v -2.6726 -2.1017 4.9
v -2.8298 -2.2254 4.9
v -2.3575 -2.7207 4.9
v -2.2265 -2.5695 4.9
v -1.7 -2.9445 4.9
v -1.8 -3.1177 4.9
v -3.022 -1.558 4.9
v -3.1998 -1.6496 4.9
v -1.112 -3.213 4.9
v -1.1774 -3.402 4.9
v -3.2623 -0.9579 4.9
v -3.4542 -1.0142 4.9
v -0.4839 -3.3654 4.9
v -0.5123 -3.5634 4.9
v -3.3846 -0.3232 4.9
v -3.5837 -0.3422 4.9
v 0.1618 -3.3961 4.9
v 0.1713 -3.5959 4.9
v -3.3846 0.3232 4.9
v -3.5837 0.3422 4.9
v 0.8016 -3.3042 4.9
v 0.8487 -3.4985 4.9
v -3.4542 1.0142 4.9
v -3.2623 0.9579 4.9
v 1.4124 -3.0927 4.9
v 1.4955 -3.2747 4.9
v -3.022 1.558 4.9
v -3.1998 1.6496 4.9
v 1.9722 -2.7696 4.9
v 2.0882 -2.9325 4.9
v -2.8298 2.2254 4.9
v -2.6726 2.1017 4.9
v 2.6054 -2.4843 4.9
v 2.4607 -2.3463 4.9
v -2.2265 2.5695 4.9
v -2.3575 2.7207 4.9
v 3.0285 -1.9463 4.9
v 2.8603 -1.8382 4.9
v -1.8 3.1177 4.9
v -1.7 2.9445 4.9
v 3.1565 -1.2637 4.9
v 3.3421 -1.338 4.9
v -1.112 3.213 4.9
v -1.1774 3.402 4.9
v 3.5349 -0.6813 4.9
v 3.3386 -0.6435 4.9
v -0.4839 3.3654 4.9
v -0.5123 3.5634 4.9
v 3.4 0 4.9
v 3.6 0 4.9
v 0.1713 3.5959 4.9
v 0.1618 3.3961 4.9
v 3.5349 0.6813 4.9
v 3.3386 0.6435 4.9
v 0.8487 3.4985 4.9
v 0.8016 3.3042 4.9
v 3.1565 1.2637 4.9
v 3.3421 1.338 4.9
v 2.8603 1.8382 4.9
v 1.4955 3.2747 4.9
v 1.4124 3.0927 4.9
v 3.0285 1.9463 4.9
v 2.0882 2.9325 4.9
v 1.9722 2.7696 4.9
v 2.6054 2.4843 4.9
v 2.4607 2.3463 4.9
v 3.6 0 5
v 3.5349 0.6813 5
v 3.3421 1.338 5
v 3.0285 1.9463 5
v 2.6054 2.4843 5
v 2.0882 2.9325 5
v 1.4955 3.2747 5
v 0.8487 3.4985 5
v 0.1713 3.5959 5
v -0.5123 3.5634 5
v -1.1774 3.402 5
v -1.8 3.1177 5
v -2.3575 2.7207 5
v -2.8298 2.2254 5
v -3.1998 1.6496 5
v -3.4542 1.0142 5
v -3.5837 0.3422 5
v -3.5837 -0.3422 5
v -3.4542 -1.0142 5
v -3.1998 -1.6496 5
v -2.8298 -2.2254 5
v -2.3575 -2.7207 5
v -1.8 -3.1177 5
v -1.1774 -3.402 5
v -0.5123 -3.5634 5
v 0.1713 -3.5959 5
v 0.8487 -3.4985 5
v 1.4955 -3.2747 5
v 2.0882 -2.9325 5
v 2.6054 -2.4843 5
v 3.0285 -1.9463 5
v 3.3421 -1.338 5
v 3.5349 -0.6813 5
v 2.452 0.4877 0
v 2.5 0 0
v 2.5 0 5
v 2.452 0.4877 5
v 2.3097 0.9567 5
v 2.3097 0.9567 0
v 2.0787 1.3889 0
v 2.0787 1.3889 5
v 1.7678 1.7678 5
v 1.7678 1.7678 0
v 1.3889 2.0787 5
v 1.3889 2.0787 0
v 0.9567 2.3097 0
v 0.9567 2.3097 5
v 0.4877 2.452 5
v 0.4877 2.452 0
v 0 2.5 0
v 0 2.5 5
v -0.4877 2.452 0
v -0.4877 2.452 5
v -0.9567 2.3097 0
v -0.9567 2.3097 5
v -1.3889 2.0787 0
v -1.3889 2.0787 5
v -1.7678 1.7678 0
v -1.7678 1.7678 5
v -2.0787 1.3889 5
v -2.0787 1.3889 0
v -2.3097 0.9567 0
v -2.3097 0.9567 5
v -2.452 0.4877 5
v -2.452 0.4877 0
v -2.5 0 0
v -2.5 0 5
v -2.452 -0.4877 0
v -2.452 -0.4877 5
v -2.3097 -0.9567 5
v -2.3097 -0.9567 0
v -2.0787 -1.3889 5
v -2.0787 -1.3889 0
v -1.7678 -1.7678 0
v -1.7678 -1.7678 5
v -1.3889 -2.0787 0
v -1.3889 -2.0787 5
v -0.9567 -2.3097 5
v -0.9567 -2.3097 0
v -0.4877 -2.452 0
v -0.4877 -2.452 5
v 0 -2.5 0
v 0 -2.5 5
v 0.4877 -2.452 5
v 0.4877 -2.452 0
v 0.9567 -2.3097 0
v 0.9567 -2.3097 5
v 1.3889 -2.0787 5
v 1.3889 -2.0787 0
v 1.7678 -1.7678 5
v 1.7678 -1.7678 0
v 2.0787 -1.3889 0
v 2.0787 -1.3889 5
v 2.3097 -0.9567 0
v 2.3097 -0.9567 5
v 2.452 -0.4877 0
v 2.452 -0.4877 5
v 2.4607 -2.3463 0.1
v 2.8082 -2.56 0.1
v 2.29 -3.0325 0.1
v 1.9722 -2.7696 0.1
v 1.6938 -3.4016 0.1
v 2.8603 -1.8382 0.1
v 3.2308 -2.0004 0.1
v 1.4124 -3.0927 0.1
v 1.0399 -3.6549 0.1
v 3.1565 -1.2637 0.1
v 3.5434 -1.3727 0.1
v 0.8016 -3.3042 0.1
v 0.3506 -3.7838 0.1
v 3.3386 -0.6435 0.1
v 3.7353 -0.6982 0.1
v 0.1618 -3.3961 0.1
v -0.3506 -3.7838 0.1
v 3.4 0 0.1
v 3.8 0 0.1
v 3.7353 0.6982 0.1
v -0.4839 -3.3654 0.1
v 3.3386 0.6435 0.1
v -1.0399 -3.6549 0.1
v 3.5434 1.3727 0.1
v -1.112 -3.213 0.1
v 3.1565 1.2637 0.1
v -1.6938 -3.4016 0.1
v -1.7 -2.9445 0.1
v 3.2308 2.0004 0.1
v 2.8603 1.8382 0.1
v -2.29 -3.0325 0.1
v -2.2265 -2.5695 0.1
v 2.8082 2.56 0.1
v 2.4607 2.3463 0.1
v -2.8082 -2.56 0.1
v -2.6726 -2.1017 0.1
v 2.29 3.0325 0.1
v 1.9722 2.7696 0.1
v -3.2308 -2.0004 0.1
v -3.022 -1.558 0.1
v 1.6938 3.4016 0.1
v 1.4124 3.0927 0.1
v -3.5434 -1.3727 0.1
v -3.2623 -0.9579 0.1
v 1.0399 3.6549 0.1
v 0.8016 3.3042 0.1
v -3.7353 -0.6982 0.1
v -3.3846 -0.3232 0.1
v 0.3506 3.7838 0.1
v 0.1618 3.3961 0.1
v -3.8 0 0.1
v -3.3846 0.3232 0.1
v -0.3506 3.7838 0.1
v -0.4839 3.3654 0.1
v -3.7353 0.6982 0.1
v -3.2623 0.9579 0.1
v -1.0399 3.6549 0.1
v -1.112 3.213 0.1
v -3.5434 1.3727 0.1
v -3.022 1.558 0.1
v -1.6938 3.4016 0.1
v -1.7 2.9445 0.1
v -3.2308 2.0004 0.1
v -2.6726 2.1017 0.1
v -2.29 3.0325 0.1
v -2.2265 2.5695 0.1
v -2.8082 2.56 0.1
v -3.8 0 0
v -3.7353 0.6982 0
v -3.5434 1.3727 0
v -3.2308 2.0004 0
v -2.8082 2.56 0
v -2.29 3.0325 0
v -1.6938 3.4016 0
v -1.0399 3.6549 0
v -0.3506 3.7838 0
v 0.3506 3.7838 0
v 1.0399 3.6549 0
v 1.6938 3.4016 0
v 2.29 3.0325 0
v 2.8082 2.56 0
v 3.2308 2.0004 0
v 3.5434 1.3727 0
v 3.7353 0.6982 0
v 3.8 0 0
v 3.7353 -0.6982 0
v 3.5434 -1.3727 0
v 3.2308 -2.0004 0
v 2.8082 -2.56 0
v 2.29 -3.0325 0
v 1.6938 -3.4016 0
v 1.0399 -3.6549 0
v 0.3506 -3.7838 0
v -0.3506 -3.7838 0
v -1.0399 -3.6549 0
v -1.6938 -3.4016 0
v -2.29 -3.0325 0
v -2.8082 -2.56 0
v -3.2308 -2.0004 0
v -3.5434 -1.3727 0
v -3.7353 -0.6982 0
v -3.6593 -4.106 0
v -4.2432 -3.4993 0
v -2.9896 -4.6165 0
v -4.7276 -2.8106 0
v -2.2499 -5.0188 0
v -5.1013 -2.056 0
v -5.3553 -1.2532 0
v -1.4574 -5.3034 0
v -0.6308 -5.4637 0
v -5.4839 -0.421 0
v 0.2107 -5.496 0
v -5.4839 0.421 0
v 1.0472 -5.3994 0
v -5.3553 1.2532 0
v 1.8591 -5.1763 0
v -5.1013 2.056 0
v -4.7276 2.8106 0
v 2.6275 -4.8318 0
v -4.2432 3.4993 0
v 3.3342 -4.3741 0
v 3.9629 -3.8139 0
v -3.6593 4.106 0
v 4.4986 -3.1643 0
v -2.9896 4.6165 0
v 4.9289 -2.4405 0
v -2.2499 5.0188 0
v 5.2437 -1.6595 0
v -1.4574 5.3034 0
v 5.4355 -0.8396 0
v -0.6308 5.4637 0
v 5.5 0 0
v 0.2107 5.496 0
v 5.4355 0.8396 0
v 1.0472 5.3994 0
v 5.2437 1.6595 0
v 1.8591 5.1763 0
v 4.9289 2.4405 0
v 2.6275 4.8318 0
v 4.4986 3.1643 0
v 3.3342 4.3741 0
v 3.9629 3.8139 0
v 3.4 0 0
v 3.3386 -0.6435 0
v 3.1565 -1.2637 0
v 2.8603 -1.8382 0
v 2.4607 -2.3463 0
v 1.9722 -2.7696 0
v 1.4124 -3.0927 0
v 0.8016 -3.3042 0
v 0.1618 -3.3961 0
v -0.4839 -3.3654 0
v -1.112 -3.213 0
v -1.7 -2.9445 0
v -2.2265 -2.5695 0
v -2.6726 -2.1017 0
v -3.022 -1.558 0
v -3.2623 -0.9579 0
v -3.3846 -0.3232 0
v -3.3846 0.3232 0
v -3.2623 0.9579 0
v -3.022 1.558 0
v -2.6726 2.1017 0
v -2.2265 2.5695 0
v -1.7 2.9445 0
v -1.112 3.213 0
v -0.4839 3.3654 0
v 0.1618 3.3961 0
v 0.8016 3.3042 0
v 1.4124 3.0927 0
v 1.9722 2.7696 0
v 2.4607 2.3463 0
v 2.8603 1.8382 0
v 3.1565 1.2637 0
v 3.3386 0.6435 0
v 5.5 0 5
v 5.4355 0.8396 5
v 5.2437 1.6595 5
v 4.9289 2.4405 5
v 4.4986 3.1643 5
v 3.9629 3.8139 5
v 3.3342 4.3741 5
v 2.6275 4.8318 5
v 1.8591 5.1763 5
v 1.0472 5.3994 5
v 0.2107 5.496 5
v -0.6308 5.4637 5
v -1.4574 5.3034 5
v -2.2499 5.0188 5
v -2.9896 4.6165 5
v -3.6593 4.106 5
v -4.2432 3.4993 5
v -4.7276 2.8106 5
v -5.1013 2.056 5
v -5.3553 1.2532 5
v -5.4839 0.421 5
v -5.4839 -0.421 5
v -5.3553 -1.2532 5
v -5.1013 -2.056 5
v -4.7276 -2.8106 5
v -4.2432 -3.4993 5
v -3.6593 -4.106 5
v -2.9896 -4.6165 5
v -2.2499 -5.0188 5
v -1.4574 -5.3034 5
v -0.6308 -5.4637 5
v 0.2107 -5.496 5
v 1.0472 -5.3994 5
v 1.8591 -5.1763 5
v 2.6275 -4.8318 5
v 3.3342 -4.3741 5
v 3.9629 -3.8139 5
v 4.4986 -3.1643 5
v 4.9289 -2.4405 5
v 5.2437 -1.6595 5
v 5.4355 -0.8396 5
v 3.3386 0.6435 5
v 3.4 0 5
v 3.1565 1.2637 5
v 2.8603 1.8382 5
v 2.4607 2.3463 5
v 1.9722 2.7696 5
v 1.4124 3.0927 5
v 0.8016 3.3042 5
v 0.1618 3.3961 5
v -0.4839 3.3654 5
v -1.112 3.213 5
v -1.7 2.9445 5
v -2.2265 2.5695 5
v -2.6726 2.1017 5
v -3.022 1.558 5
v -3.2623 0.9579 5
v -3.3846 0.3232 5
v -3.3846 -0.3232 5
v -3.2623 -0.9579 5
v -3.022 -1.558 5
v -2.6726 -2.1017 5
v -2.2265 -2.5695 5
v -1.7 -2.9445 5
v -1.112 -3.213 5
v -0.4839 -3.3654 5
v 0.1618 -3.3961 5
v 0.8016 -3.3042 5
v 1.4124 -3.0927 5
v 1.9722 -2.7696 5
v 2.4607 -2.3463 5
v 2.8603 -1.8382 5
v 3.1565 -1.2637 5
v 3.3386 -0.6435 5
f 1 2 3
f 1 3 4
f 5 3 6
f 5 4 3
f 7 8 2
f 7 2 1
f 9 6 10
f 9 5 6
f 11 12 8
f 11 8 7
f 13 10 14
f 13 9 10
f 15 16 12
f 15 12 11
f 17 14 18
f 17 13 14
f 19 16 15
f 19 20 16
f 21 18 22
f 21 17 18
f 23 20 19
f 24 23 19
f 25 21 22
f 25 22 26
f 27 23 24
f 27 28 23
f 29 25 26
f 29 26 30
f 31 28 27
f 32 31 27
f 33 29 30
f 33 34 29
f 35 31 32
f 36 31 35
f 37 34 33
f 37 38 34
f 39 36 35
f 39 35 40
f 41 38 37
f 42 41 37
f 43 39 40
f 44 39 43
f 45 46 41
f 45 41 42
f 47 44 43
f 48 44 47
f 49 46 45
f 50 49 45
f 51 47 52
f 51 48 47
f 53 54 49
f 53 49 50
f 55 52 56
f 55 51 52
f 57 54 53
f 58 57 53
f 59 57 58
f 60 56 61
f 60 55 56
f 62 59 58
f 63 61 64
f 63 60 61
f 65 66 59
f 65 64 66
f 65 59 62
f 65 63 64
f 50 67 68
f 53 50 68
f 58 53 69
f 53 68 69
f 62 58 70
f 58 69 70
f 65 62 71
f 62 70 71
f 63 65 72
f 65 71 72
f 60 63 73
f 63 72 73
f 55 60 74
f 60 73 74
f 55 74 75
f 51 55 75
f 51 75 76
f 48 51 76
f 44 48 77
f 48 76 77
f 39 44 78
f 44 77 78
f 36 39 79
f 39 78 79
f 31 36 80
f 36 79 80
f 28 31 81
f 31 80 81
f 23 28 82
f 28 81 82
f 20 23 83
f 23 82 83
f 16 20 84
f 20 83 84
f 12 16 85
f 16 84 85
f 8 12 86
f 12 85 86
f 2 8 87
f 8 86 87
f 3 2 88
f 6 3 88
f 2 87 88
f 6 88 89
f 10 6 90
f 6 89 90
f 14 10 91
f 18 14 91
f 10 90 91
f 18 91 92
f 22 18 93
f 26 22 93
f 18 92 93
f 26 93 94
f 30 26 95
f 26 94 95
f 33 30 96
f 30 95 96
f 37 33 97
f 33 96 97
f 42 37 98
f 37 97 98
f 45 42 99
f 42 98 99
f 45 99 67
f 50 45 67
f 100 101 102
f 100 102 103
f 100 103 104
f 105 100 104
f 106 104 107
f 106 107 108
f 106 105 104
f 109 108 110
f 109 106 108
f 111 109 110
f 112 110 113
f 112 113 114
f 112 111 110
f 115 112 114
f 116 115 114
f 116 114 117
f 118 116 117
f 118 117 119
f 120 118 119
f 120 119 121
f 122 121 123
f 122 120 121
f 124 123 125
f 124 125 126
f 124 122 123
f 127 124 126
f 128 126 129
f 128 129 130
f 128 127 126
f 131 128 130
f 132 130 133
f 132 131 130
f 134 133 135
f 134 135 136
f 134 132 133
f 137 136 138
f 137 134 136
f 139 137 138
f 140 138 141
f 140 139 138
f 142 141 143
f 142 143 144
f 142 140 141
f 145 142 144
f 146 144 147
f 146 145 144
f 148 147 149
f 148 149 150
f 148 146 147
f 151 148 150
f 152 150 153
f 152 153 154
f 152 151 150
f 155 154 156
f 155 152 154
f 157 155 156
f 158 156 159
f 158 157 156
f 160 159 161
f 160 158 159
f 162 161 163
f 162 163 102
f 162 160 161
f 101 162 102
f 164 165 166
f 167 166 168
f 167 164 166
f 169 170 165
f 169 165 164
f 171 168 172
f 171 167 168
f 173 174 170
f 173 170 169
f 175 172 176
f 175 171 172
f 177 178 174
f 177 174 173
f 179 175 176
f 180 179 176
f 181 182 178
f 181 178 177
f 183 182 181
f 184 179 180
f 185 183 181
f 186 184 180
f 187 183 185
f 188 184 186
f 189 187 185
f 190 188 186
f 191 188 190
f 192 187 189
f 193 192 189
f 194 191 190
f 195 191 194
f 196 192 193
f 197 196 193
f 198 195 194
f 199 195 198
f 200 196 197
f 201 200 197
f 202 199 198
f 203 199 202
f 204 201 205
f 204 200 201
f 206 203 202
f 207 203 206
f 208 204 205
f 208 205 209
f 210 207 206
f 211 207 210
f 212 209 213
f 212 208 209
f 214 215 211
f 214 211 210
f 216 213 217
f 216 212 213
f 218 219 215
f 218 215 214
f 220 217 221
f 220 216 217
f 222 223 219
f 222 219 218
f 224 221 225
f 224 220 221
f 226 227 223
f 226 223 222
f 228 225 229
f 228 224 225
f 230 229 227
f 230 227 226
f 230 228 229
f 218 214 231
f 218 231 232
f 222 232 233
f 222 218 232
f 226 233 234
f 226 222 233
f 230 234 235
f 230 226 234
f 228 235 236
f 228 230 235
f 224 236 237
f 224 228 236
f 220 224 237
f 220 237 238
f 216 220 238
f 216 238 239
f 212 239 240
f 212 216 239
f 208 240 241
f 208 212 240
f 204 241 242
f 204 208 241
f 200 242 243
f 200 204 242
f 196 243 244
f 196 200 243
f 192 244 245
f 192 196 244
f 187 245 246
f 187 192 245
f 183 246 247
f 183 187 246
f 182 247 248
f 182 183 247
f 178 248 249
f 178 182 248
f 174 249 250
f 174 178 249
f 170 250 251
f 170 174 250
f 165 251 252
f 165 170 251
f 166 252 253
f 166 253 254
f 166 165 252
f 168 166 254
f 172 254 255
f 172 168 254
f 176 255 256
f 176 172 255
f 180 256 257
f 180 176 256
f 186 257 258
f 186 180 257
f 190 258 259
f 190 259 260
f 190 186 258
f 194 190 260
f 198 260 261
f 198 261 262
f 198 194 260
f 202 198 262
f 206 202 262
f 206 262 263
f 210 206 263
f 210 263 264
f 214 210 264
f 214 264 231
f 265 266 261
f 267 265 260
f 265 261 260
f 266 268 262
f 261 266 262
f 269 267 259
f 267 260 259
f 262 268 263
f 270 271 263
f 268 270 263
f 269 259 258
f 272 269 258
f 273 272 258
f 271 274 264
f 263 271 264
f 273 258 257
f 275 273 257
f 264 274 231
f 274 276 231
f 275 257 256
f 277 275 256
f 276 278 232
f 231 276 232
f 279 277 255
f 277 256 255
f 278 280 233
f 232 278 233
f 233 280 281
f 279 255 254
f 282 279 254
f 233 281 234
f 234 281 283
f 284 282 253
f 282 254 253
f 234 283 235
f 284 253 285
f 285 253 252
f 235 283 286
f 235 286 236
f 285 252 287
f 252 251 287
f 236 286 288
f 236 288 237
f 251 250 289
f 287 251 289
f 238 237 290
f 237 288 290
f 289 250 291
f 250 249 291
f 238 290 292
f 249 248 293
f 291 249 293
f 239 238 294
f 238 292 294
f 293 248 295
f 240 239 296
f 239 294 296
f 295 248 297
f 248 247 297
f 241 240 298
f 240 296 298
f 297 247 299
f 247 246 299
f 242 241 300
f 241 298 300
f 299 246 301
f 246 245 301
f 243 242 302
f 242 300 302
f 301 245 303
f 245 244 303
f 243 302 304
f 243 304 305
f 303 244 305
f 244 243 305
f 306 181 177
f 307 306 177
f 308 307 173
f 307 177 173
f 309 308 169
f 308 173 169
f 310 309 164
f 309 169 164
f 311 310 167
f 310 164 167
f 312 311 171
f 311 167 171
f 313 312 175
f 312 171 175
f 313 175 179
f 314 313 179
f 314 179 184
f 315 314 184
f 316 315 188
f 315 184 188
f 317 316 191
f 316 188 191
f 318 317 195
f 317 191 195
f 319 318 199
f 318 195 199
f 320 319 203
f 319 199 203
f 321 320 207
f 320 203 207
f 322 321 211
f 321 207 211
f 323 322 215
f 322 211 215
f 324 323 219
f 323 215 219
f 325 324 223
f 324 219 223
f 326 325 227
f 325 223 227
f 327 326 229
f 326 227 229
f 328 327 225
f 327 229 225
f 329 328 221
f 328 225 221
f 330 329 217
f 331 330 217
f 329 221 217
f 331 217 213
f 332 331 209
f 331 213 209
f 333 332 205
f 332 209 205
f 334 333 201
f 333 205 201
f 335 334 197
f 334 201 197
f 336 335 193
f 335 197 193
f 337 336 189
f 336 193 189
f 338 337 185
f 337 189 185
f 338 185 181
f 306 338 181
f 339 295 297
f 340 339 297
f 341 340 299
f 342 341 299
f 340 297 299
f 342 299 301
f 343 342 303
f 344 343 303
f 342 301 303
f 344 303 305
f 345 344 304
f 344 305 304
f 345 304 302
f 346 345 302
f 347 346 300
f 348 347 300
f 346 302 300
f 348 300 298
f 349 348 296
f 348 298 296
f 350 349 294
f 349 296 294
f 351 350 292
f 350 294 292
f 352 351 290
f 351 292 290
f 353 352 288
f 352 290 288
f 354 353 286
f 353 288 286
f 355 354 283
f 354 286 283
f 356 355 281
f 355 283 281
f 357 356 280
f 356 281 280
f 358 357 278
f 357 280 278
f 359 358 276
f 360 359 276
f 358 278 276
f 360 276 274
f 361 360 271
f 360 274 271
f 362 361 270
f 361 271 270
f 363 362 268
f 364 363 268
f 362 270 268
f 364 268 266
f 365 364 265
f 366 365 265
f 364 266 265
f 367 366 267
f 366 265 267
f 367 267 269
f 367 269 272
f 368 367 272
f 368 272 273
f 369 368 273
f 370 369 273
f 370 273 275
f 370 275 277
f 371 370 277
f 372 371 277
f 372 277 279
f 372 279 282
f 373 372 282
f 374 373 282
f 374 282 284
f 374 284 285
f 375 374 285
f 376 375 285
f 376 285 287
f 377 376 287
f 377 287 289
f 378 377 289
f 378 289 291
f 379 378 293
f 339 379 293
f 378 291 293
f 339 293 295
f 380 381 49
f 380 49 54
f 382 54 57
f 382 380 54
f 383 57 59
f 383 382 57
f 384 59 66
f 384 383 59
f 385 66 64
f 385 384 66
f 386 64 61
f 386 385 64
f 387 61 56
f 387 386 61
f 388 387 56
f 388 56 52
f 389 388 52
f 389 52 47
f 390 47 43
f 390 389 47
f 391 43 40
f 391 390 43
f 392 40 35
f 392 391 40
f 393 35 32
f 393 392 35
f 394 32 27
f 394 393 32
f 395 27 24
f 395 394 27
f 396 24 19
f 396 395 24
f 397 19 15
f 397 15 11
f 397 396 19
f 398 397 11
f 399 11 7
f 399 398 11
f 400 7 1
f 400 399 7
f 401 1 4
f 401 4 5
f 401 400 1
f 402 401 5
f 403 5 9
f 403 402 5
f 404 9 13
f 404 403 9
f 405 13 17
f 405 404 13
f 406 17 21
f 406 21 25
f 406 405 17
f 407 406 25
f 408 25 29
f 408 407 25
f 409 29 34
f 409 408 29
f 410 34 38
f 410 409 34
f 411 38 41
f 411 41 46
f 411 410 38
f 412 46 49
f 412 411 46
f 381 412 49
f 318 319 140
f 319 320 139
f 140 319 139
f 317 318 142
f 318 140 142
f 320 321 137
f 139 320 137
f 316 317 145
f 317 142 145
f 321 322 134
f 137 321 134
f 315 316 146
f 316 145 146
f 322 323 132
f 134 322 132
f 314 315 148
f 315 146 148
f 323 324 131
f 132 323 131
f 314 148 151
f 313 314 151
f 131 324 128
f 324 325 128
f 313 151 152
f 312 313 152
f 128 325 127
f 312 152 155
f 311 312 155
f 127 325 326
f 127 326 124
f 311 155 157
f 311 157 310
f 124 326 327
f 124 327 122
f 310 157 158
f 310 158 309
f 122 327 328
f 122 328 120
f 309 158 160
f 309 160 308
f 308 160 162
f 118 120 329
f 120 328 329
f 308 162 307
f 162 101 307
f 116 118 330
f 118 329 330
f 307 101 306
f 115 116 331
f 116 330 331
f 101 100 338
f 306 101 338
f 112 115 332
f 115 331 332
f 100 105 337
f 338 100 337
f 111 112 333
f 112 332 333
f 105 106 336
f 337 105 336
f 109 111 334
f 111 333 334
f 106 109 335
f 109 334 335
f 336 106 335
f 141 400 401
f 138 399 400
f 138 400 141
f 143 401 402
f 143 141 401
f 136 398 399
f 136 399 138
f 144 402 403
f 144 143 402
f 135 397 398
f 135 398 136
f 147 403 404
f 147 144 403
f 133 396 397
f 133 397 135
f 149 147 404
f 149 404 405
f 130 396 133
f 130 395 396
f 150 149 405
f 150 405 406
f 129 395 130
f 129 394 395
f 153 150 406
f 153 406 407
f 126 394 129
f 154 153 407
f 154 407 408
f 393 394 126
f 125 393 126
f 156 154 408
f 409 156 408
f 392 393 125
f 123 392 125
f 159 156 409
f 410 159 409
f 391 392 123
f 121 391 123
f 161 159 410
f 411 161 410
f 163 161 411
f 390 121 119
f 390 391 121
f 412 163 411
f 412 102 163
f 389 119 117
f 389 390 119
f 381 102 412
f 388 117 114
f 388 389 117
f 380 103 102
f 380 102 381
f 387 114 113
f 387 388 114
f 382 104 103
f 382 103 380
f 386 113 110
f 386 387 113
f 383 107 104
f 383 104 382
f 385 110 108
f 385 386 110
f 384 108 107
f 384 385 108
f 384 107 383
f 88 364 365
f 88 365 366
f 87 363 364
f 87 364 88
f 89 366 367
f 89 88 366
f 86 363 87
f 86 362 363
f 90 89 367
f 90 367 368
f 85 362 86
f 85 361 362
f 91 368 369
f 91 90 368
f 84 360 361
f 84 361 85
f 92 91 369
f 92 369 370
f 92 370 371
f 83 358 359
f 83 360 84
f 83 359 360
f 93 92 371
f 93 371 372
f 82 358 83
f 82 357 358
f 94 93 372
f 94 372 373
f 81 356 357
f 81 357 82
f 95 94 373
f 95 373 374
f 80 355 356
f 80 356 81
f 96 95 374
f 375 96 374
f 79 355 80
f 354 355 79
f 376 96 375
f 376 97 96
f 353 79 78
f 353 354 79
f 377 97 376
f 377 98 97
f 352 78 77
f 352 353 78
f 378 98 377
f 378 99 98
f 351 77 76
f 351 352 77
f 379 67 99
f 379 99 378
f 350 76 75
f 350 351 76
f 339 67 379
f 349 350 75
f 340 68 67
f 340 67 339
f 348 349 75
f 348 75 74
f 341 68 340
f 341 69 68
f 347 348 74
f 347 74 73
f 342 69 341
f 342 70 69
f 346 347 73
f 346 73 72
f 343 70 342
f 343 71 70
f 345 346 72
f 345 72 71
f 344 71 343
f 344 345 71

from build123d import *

# Parameters (mm, degrees)
SKETCH1_R           = 5.5
SKETCH1_R_2         = 2.5
BOSS_EXTRUDE1_DEPTH = 5
SKETCH2_R           = 3.6
SKETCH2_R_2         = 3.4
CUT_EXTRUDE1_DEPTH  = 0.1
CUT_EXTRUDE2_START  = -0.1
SKETCH3_R           = 3.8
SKETCH3_R_2         = 3.4
CUT_EXTRUDE2_DEPTH  = 0.1


with BuildPart() as part:
    # Sketch1 → Boss-Extrude1 (new body)
    with BuildSketch(Plane.XY):
        Circle(SKETCH1_R)
        Circle(SKETCH1_R_2, mode=Mode.SUBTRACT)
    extrude(amount=BOSS_EXTRUDE1_DEPTH)

    # Sketch2 → Cut-Extrude1 (cut)
    with BuildSketch(Plane.XY.offset(5)):
        Circle(SKETCH2_R)
        Circle(SKETCH2_R_2, mode=Mode.SUBTRACT)
    extrude(amount=-CUT_EXTRUDE1_DEPTH, mode=Mode.SUBTRACT)

    # Sketch3 → Cut-Extrude2 (cut)
    with BuildSketch(Plane(origin=(0, 0, 0), x_dir=(-1, 0, 0), z_dir=(0, 0, -1)).offset(CUT_EXTRUDE2_START)):
        Circle(SKETCH3_R)
        with Locations(Location((0, 0, 0), (0, 0, 180))):
            Circle(SKETCH3_R_2, mode=Mode.SUBTRACT)
    extrude(amount=CUT_EXTRUDE2_DEPTH, mode=Mode.SUBTRACT)


solid = part.part
